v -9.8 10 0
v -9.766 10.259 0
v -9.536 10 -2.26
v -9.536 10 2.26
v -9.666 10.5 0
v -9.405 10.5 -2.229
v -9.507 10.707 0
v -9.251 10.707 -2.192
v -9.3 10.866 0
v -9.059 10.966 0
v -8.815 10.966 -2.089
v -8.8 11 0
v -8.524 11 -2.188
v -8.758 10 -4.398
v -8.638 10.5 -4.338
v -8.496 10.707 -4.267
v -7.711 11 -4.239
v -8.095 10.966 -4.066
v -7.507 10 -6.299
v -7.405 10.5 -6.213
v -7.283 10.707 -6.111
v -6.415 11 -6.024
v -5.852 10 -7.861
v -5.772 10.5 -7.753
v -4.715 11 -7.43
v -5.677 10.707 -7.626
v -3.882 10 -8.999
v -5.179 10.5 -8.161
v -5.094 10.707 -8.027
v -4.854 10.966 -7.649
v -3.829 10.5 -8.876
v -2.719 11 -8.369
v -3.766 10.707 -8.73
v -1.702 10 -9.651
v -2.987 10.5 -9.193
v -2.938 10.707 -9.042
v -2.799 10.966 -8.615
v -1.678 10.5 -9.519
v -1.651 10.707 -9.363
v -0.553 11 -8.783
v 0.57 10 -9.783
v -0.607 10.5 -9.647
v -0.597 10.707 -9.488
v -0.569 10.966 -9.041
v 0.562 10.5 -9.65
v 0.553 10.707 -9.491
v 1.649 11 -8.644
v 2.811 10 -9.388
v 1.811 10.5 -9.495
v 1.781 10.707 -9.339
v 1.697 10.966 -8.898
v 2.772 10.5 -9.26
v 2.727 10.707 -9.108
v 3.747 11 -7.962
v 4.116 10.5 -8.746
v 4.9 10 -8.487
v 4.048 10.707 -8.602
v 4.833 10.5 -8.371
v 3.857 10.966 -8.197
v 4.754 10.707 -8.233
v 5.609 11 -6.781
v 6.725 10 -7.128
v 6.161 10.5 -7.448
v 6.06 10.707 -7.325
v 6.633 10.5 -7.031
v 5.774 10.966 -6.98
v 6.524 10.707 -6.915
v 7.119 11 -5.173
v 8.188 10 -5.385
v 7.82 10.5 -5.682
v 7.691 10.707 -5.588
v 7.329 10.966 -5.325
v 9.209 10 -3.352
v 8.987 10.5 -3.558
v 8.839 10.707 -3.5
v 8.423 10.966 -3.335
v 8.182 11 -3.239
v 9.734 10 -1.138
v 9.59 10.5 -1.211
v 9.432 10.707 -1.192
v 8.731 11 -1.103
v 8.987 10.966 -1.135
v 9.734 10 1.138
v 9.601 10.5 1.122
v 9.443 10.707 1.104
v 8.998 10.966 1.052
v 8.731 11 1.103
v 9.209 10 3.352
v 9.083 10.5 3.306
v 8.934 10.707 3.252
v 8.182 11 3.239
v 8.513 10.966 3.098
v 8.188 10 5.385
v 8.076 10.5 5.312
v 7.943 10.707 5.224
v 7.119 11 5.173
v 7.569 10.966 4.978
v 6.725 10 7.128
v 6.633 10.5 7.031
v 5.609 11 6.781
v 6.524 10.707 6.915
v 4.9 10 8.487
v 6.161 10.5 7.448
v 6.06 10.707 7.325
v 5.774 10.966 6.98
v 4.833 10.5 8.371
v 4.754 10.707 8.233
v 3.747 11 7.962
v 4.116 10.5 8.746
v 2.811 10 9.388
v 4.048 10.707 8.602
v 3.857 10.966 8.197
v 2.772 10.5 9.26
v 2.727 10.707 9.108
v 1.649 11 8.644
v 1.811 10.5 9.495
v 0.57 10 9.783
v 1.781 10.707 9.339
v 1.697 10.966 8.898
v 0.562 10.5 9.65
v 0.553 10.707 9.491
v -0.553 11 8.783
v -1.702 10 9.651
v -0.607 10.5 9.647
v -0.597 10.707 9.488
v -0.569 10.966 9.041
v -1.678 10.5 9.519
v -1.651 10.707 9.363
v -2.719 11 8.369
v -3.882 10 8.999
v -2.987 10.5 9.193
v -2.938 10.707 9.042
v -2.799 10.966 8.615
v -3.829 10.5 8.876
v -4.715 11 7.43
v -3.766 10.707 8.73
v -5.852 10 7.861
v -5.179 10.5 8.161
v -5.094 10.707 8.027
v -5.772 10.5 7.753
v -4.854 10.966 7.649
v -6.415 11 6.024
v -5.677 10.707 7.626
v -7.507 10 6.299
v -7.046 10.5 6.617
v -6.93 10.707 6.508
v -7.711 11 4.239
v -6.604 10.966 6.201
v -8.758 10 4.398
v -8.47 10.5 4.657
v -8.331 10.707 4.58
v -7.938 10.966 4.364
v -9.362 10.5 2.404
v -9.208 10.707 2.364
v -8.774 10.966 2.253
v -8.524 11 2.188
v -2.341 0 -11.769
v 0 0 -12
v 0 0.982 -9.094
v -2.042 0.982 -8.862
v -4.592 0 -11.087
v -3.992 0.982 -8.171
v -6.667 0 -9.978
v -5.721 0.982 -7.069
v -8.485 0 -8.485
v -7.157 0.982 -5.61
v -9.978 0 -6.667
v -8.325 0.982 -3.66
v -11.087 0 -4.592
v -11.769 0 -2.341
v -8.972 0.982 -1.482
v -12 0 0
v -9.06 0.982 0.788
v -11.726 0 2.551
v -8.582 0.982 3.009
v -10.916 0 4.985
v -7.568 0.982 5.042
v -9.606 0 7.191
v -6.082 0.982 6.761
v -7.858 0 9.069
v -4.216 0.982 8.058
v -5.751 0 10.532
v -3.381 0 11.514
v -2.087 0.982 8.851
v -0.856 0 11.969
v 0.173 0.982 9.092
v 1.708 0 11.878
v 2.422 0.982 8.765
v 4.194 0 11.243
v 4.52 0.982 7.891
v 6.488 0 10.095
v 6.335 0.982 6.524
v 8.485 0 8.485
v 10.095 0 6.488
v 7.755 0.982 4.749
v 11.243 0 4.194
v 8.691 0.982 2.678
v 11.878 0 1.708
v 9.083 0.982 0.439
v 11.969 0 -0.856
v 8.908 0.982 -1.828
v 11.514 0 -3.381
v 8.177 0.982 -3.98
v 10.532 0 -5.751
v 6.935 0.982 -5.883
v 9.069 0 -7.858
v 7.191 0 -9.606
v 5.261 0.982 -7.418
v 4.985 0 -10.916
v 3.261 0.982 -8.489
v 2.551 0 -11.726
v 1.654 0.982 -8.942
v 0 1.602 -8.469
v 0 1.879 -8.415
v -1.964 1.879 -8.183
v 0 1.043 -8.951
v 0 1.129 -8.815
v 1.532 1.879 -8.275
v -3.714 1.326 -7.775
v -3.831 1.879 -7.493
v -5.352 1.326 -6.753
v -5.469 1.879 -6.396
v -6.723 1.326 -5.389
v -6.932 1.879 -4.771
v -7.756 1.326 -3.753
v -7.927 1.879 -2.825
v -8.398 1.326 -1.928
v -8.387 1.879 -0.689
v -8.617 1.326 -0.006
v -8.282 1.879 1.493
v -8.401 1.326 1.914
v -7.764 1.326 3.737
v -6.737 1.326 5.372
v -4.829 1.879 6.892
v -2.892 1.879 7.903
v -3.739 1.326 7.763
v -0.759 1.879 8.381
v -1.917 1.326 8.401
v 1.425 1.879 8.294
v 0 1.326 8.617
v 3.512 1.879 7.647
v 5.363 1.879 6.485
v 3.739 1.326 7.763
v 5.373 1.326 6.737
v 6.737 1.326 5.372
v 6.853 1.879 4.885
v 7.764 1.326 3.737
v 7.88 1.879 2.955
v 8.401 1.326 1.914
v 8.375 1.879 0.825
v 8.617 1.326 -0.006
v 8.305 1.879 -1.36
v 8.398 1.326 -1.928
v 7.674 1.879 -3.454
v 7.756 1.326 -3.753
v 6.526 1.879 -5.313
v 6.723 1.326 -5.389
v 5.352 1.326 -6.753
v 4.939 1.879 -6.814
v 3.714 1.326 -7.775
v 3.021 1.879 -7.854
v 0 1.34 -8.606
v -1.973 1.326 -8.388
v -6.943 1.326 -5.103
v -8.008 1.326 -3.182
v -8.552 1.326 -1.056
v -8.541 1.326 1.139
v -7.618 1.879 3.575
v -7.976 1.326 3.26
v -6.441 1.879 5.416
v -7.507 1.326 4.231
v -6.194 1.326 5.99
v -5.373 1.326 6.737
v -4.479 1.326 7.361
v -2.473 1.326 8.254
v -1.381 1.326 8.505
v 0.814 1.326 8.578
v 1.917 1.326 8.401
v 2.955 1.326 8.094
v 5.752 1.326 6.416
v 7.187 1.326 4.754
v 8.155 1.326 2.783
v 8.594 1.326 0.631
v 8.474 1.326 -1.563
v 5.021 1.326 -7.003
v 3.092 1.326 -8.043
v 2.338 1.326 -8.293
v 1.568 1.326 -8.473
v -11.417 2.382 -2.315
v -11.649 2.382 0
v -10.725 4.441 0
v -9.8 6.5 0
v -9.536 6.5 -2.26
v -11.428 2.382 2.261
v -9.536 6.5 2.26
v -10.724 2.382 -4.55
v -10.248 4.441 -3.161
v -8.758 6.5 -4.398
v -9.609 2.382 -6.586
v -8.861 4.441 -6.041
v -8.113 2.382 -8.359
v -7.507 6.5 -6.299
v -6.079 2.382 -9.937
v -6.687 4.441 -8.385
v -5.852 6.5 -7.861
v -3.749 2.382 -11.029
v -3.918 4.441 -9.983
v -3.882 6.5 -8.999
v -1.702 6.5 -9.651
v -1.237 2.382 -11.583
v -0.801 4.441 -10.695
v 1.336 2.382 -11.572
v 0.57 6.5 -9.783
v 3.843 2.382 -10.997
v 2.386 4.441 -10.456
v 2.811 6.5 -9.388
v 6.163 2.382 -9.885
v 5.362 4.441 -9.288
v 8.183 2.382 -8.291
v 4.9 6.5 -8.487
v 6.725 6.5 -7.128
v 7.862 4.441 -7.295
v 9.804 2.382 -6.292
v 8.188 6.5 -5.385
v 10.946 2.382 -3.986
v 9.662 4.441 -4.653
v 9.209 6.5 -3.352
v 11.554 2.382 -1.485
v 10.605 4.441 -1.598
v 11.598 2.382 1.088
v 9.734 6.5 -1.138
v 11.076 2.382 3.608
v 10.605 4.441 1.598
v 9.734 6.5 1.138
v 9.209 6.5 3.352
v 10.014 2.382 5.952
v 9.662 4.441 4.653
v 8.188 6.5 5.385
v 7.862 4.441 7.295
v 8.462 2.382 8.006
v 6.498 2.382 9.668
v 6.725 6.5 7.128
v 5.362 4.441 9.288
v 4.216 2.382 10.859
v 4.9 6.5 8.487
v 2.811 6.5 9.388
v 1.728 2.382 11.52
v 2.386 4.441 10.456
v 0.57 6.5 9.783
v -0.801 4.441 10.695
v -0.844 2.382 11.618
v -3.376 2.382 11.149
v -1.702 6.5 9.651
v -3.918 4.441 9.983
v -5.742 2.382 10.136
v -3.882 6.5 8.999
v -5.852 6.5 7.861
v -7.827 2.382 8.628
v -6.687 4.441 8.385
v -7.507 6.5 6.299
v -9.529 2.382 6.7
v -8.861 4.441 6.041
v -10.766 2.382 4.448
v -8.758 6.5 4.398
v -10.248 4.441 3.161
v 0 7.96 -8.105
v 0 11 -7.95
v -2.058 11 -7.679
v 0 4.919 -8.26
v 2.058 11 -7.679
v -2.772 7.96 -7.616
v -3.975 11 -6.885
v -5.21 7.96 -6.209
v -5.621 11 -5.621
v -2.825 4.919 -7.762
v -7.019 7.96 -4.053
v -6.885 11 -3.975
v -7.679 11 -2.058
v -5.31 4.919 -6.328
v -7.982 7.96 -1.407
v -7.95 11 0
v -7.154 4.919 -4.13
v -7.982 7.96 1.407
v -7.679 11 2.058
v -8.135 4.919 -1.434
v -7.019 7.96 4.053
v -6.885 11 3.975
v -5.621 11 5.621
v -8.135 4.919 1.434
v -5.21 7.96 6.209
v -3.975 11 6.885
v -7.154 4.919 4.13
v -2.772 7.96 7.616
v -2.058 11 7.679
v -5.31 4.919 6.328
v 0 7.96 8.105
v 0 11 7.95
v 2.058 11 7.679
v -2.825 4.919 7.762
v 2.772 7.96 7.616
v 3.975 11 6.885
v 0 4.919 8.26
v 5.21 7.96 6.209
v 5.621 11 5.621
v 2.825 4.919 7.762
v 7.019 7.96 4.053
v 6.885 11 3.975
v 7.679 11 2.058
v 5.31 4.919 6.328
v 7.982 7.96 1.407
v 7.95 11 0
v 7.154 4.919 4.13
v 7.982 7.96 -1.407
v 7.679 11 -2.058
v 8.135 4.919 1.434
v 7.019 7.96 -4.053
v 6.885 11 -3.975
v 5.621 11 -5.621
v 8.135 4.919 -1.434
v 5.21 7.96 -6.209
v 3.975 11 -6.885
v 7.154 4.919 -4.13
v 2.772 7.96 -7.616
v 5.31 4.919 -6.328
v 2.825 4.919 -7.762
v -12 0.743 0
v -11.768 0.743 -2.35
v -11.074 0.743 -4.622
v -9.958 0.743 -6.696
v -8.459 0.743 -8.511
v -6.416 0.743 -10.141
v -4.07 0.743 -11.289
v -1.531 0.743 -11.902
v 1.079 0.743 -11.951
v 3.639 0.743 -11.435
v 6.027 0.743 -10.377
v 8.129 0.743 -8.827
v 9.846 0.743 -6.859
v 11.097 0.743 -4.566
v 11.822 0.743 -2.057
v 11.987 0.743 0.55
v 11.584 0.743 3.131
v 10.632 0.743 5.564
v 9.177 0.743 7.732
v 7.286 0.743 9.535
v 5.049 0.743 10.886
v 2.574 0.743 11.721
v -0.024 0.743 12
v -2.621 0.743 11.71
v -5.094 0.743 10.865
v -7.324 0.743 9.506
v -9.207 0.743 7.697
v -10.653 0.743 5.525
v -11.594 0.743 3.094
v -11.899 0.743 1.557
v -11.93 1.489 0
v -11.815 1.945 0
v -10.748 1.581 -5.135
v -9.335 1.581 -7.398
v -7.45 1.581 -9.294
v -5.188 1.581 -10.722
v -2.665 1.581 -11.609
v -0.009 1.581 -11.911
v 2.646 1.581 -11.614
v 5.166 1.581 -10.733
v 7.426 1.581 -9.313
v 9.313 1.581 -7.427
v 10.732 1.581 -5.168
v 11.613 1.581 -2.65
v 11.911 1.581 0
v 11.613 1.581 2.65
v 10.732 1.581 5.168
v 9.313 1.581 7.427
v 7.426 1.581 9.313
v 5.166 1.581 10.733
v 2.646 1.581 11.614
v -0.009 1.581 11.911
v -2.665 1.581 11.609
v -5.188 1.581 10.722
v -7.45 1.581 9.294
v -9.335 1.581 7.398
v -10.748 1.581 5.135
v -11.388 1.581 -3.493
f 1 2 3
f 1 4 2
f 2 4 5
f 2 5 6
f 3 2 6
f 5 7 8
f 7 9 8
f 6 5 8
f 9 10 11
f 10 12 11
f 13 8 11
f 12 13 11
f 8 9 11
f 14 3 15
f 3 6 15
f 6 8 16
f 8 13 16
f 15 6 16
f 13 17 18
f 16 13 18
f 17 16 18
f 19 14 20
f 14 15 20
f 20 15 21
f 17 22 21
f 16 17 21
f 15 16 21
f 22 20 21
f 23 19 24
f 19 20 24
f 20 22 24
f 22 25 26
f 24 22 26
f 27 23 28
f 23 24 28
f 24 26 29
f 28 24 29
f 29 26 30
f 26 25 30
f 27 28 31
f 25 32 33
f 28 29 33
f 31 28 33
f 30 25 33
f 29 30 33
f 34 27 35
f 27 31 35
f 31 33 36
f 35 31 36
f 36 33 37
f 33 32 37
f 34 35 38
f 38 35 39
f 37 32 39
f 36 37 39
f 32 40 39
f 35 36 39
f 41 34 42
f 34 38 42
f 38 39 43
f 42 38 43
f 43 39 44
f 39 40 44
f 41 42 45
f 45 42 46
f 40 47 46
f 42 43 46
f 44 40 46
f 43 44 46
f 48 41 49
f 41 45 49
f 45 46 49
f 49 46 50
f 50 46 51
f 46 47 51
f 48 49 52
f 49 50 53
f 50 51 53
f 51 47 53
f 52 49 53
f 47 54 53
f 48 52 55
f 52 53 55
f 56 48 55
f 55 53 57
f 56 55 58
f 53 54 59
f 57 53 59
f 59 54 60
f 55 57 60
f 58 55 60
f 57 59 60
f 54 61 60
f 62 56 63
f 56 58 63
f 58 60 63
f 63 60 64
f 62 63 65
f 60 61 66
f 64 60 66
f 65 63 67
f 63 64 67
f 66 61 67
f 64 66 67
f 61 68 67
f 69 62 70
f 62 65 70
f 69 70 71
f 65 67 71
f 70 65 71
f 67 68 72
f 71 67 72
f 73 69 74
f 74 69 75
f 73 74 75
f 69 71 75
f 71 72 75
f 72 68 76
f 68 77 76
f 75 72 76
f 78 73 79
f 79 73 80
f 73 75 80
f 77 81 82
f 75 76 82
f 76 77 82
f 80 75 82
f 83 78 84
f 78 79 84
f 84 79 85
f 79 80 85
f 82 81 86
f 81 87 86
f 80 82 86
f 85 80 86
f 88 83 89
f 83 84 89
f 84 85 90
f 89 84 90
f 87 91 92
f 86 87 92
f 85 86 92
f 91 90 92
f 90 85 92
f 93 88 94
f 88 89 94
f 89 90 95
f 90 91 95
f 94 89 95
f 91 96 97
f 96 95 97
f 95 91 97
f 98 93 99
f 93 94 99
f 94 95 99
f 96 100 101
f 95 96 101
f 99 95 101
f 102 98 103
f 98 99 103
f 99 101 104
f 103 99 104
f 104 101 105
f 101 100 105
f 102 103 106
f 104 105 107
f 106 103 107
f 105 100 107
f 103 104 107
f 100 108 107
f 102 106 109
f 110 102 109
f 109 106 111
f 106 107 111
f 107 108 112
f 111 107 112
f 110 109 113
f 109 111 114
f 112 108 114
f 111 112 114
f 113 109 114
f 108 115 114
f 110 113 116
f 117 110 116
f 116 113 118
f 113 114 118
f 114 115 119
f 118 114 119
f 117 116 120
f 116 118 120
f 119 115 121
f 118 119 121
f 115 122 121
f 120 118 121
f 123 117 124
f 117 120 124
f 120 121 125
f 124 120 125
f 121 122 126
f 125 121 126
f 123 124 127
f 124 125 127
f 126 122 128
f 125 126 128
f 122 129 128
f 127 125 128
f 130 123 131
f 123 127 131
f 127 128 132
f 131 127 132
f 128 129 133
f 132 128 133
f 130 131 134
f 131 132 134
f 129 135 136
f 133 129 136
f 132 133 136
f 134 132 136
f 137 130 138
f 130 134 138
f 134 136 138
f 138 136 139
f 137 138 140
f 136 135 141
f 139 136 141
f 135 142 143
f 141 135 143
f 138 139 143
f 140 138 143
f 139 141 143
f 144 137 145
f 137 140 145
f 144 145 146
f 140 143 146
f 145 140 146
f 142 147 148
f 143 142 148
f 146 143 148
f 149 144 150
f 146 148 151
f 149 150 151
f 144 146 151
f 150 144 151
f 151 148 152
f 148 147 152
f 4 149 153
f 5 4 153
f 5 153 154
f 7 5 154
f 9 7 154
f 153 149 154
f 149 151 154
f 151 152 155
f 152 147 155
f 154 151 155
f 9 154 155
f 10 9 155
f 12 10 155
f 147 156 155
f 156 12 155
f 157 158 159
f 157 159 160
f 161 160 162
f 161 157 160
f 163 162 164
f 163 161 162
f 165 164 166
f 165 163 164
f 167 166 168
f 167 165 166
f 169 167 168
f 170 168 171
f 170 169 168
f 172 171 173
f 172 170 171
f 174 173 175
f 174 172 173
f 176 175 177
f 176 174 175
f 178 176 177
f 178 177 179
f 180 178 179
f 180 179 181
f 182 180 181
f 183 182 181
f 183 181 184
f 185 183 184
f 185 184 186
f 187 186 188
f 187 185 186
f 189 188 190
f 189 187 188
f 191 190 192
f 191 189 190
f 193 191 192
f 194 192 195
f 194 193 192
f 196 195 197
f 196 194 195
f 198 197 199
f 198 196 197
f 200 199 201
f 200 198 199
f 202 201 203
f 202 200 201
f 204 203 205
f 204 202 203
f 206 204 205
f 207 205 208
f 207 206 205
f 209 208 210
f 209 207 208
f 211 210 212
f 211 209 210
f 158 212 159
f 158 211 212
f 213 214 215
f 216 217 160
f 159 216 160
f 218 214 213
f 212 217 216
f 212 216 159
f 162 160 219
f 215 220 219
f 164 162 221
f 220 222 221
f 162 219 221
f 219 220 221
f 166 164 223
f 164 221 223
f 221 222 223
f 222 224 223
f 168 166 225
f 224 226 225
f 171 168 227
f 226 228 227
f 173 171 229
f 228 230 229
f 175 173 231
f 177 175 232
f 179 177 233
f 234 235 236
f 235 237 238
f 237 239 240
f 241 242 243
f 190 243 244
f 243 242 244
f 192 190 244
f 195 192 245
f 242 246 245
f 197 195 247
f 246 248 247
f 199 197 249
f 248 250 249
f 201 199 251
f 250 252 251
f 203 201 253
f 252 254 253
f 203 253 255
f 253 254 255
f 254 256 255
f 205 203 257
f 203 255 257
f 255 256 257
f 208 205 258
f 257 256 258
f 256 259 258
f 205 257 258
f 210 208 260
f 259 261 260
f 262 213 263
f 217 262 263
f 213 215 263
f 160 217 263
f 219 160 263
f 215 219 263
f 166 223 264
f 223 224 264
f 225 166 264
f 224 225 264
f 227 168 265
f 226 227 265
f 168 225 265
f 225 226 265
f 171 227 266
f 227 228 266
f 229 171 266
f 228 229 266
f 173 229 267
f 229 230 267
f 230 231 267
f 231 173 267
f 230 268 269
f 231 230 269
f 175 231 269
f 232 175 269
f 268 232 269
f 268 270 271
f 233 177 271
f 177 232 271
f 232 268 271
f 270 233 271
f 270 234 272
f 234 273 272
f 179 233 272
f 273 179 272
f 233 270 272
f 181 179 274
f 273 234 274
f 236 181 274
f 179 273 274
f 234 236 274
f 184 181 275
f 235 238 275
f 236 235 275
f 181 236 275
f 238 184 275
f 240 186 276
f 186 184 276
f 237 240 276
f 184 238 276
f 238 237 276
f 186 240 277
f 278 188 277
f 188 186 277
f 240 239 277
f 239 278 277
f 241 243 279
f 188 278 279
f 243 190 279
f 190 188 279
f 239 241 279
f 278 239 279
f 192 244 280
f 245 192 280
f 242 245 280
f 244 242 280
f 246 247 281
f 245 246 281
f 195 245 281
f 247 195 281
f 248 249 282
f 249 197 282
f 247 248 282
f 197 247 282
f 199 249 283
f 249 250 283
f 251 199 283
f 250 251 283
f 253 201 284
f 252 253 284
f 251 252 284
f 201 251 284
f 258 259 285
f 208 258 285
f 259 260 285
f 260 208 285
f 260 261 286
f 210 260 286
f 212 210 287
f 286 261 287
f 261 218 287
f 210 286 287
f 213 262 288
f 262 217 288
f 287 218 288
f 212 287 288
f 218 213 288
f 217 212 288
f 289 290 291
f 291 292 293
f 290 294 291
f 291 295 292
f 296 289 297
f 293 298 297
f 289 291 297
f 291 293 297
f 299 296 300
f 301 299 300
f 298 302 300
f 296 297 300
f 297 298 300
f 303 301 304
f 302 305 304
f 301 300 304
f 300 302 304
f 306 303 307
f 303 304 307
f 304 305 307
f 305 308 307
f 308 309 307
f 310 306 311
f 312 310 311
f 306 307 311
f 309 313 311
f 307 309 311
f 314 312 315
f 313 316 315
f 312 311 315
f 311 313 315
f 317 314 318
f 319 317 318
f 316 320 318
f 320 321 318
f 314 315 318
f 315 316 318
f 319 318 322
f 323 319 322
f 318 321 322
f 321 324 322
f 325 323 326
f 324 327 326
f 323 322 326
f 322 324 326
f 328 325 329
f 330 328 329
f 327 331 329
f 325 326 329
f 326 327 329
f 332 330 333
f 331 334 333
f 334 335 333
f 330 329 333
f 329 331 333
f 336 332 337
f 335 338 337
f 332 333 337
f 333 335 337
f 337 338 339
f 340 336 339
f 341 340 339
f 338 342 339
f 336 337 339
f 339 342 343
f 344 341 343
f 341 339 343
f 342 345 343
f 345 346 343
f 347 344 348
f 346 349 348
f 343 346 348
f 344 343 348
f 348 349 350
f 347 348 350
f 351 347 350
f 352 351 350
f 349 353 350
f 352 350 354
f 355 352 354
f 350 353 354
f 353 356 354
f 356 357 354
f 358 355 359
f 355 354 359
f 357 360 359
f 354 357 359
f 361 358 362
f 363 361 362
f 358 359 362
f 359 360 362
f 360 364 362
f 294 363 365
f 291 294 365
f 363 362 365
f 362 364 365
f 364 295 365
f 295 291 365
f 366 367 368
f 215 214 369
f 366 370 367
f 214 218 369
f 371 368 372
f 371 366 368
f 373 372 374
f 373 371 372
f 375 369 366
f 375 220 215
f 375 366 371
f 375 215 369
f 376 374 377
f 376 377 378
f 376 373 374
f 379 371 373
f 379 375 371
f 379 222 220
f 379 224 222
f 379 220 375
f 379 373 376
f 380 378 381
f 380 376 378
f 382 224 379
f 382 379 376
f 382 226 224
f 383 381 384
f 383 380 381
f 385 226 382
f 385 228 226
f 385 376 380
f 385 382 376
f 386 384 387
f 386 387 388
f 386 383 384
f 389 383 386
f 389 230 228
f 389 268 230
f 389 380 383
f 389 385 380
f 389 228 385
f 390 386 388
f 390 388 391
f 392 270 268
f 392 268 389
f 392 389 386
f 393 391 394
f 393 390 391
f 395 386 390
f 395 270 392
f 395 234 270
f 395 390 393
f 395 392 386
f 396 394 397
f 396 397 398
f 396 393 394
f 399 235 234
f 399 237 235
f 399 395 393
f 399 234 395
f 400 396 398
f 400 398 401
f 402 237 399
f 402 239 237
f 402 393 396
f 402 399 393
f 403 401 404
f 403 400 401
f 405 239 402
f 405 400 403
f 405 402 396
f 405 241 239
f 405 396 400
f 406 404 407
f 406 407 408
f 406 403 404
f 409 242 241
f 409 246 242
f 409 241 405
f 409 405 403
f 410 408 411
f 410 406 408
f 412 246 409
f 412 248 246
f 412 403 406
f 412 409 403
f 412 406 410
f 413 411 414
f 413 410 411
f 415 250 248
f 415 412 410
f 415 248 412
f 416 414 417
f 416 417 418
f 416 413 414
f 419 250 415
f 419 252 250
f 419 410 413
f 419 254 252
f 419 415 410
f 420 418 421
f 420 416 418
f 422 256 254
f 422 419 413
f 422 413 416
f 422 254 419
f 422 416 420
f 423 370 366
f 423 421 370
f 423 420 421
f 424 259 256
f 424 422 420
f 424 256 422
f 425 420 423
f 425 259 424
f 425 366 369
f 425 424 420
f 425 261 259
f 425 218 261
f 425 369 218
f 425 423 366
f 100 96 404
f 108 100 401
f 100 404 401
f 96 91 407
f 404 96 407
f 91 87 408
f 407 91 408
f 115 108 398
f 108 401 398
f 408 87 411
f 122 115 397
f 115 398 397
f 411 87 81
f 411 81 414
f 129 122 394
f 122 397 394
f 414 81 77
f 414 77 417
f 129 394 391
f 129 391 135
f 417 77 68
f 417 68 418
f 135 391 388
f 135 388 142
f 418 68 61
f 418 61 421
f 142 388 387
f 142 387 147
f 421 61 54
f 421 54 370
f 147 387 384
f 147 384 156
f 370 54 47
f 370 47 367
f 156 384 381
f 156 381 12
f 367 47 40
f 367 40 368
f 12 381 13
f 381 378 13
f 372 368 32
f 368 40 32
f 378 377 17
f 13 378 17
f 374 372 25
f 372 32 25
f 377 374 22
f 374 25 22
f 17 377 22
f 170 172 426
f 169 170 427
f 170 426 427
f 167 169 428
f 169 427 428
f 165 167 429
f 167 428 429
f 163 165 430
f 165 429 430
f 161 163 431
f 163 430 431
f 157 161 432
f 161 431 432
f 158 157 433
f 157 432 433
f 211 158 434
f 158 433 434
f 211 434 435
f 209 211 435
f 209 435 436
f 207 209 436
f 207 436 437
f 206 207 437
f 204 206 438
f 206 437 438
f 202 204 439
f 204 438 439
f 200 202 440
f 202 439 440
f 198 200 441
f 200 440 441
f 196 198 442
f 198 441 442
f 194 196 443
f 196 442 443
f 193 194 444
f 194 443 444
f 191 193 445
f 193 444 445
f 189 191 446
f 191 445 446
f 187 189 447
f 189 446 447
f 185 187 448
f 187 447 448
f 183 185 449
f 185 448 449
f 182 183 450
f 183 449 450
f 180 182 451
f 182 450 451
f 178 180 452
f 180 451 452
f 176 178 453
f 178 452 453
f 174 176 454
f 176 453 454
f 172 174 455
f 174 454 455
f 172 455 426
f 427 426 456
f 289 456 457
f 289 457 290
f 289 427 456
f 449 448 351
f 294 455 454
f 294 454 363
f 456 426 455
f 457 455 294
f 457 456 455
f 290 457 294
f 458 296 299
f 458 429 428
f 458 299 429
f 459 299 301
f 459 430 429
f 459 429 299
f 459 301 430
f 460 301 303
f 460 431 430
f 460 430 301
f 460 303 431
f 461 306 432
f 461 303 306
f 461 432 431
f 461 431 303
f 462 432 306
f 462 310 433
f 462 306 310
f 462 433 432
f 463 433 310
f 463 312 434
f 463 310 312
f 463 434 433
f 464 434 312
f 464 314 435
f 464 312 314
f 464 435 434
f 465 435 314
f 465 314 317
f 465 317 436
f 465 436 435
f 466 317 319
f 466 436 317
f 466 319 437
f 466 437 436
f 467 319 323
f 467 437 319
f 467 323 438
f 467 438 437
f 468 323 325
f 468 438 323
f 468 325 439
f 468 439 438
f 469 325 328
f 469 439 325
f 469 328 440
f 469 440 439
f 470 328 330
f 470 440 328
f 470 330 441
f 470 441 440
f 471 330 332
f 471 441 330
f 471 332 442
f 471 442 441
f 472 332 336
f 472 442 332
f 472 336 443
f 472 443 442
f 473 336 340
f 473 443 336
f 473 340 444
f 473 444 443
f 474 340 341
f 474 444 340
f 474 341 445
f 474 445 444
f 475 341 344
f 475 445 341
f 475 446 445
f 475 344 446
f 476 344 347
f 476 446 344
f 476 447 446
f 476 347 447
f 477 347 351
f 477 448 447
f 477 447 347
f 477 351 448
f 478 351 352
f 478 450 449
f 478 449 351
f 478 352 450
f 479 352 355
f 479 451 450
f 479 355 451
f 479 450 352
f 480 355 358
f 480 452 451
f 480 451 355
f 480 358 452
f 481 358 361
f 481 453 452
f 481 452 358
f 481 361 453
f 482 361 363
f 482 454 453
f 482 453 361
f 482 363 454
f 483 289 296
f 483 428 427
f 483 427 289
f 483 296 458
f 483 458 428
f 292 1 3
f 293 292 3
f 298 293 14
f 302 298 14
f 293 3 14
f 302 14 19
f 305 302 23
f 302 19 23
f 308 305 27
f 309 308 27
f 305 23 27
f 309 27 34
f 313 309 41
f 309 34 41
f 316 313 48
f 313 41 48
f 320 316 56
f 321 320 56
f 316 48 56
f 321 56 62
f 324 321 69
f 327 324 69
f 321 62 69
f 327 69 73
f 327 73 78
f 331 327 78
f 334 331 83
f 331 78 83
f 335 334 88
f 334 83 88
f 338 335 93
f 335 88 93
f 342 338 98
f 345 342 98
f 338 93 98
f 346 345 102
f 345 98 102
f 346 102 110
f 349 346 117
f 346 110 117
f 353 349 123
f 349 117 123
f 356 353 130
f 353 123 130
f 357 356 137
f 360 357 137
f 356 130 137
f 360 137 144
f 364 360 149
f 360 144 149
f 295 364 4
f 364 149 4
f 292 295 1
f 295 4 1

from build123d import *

# Parameters (mm, degrees)
FILLET1_R = 1
FILLET2_R = 1
FILLET3_R = 4


with BuildPart() as part:
    # Sketch2 → Revolve1 (revolve)
    with BuildSketch(Plane.XY, mode=Mode.PRIVATE) as revolve1_sk:
        Polygon((0, 0), (12, 0), (12, 1.6), (9.8, 6.5), (9.8, 11), (0, 11), align=None)
    revolve(revolve1_sk.sketch.rotate(Axis((0, 11, 0), (0, -1, 0)), 180), axis=Axis((0, 11, 0), (0, -1, 0)))

    # Sketch4 → Cut-Revolve1 (revolve, cut)
    with BuildSketch(Plane.XY, mode=Mode.PRIVATE) as cut_revolve1_sk:
        Polygon((0, 0), (0, 11), (7.95, 11), (8.45, 1.2), (12, 0), align=None)
    revolve(cut_revolve1_sk.sketch.rotate(Axis((0, 0, 0), (0, 1, 0)), 90), axis=Axis((0, 0, 0), (0, 1, 0)), mode=Mode.SUBTRACT)

    # Fillet1
    fillet1_edges = [part.edges().sort_by_distance(p)[0] for p in [
        (9.8, 11, 0),
    ]]
    fillet(fillet1_edges, radius=FILLET1_R)

    # Fillet2
    fillet2_edges = [part.edges().sort_by_distance(p)[0] for p in [
        (0, 1.2, 8.45),
    ]]
    fillet(fillet2_edges, radius=FILLET2_R)

    # Fillet3
    fillet3_edges = [part.edges().sort_by_distance(p)[0] for p in [
        (12, 1.6, 0),
    ]]
    fillet(fillet3_edges, radius=FILLET3_R)


solid = part.part
